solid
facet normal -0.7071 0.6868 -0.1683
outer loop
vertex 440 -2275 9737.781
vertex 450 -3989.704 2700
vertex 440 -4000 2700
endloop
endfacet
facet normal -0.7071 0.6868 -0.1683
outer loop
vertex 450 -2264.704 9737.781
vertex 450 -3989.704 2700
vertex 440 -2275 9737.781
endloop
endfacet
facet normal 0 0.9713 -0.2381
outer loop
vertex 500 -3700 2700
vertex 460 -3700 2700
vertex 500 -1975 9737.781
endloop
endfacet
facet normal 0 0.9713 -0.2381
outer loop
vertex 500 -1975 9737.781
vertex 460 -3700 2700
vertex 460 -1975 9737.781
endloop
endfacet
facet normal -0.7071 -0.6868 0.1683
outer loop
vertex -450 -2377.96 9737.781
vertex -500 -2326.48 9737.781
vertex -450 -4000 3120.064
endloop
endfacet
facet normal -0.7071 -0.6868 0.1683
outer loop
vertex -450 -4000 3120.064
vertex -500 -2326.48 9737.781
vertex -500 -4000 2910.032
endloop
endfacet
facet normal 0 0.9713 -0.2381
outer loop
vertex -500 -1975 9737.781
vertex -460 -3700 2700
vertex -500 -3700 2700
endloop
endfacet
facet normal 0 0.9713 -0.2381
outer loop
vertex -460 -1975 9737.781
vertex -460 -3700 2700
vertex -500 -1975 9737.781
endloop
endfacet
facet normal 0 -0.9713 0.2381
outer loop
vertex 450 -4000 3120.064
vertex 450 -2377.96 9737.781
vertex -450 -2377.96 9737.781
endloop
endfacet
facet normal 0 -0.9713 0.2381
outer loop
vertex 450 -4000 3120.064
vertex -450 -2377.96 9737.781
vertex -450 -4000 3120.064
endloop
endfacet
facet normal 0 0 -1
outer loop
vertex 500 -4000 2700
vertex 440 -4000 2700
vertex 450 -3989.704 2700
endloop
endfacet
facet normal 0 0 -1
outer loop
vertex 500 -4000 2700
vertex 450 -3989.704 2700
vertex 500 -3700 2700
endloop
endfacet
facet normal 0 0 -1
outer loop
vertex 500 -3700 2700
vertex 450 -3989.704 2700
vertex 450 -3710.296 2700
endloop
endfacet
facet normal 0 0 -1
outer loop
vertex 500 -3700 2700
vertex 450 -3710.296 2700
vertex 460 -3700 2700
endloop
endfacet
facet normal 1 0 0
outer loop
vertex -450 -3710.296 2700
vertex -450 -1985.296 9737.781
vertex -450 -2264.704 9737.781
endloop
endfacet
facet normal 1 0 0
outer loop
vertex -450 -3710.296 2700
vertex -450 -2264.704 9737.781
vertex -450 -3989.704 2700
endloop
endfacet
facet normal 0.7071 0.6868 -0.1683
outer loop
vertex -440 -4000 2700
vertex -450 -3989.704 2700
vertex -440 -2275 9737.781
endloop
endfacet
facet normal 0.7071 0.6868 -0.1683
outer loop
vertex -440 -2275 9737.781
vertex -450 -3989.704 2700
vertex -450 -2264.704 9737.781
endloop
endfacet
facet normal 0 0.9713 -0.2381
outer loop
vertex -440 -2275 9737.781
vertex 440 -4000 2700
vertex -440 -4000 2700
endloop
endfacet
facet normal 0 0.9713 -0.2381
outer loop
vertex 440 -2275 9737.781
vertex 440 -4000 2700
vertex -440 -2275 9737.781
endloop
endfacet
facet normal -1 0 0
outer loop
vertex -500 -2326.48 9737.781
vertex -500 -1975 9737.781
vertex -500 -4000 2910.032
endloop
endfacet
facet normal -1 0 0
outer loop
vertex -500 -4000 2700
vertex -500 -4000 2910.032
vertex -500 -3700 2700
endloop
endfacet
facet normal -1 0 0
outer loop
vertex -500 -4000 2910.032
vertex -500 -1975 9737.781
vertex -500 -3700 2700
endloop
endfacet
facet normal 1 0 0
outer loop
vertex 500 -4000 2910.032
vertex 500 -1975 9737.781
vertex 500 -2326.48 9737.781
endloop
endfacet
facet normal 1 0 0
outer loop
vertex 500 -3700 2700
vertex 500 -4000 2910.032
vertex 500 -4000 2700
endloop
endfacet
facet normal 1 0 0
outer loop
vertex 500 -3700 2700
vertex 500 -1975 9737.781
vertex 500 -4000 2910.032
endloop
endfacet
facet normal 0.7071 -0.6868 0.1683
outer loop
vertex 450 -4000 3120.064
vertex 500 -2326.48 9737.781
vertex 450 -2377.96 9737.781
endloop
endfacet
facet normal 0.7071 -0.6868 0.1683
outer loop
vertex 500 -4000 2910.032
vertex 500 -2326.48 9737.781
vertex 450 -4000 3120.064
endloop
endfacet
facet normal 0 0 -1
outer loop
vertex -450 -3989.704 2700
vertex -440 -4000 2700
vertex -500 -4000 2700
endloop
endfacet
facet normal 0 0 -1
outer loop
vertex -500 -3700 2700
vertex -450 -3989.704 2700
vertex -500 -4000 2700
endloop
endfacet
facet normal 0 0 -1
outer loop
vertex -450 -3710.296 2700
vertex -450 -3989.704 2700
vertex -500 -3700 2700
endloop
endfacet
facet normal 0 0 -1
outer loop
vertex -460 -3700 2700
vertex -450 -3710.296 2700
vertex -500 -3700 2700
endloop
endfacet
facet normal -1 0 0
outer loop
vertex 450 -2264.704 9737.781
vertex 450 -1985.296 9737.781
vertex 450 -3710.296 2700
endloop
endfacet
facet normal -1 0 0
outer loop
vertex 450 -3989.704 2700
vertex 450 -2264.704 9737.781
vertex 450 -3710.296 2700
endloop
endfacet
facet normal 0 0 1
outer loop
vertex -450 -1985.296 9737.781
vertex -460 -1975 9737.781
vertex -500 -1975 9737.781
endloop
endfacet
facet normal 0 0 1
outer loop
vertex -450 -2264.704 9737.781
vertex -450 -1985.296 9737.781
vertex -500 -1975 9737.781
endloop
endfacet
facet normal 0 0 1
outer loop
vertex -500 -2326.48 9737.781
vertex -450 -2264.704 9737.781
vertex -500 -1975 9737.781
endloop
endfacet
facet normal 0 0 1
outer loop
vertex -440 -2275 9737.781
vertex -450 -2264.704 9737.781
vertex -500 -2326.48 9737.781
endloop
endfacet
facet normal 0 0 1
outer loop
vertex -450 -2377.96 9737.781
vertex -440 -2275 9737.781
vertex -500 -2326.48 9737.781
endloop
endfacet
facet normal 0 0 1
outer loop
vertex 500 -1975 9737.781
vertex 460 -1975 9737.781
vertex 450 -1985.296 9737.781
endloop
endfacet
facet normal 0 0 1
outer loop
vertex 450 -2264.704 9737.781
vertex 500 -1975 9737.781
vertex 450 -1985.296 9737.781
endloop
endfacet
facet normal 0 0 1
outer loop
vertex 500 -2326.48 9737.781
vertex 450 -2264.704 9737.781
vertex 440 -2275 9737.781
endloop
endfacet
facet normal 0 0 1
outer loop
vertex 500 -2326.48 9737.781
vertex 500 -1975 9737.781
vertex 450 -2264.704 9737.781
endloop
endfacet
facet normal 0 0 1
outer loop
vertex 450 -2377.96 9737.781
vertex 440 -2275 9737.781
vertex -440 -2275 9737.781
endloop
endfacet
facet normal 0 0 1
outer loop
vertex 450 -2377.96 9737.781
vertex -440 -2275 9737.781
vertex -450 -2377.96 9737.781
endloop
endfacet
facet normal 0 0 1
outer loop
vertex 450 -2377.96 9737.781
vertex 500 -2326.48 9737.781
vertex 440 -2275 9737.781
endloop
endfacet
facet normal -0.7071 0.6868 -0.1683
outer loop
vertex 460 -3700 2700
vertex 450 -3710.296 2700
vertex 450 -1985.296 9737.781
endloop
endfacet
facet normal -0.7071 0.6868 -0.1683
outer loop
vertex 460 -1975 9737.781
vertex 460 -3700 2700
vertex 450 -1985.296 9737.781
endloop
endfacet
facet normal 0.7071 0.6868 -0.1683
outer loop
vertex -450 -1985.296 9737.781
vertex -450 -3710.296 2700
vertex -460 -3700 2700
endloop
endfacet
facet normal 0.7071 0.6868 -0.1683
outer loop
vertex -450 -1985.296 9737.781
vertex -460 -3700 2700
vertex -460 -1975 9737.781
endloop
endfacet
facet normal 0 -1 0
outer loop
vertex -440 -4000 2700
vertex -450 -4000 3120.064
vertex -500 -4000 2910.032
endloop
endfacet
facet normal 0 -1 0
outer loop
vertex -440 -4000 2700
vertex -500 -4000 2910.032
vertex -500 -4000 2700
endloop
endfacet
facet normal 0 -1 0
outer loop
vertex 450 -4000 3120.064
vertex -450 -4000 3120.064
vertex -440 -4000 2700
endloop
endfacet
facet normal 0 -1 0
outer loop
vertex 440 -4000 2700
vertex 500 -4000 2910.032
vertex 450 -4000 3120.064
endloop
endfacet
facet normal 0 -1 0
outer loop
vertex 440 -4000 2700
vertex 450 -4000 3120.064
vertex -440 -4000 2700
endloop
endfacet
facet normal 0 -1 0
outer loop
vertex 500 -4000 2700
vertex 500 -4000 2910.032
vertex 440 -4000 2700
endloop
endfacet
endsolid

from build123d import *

# Parameters (mm, degrees)
EXTRUDE_1_DEPTH = 450
EXTRUDE_2_DEPTH = 50
CHAMFER_1_SIZE  = 10
CHAMFER_3_SIZE  = 50
CHAMFER_2_SIZE  = 10


with BuildPart() as part:
    # ｽｹｯﾁ1 → ﾎﾞｽ - 押し出し1 (new body)
    with BuildSketch(Plane(origin=(0, 0, 0), x_dir=(0, 0, -1), z_dir=(1, 0, 0))):
        Polygon((-9737.78080468, -2275), (-9737.78080468, -2377.960030638), (-3120.063841898, -4000), (-2700, -4000), align=None)
    extrude(amount=EXTRUDE_1_DEPTH)

    # ｽｹｯﾁ2 → ﾎﾞｽ - 押し出し2 (add)
    with BuildSketch(Plane(origin=(450, 0, 0), x_dir=(0, 0, -1), z_dir=(1, 0, 0))):
        Polygon((-2700, -4000), (-2700, -3700), (-9737.78080468, -1975), (-9737.78080468, -2377.960030638), (-3120.063841898, -4000), align=None)
    extrude(amount=EXTRUDE_2_DEPTH)

    # 面取り1
    chamfer_1_edges = [part.edges().sort_by_distance(p)[0] for p in [
        (450, -3137.5, 6218.89040234),
    ]]
    chamfer(chamfer_1_edges, length=CHAMFER_1_SIZE)

    # 面取り3
    chamfer_3_edges = [part.edges().sort_by_distance(p)[0] for p in [
        (500, -3188.980015319, 6428.922323289),
    ]]
    chamfer(chamfer_3_edges, length=CHAMFER_3_SIZE)

    # 面取り2
    chamfer_2_edges = [part.edges().sort_by_distance(p)[0] for p in [
        (450, -2837.5, 6218.89040234),
    ]]
    chamfer(chamfer_2_edges, length=CHAMFER_2_SIZE)

    # ﾐﾗｰ1: part across plane


with BuildPart() as part_1:
    add(part.part)
    add(part.part.mirror(Plane(origin=(0, 0, 0), x_dir=(0, 0, 1), z_dir=(1, 0, 0))))


solid = part_1.part
